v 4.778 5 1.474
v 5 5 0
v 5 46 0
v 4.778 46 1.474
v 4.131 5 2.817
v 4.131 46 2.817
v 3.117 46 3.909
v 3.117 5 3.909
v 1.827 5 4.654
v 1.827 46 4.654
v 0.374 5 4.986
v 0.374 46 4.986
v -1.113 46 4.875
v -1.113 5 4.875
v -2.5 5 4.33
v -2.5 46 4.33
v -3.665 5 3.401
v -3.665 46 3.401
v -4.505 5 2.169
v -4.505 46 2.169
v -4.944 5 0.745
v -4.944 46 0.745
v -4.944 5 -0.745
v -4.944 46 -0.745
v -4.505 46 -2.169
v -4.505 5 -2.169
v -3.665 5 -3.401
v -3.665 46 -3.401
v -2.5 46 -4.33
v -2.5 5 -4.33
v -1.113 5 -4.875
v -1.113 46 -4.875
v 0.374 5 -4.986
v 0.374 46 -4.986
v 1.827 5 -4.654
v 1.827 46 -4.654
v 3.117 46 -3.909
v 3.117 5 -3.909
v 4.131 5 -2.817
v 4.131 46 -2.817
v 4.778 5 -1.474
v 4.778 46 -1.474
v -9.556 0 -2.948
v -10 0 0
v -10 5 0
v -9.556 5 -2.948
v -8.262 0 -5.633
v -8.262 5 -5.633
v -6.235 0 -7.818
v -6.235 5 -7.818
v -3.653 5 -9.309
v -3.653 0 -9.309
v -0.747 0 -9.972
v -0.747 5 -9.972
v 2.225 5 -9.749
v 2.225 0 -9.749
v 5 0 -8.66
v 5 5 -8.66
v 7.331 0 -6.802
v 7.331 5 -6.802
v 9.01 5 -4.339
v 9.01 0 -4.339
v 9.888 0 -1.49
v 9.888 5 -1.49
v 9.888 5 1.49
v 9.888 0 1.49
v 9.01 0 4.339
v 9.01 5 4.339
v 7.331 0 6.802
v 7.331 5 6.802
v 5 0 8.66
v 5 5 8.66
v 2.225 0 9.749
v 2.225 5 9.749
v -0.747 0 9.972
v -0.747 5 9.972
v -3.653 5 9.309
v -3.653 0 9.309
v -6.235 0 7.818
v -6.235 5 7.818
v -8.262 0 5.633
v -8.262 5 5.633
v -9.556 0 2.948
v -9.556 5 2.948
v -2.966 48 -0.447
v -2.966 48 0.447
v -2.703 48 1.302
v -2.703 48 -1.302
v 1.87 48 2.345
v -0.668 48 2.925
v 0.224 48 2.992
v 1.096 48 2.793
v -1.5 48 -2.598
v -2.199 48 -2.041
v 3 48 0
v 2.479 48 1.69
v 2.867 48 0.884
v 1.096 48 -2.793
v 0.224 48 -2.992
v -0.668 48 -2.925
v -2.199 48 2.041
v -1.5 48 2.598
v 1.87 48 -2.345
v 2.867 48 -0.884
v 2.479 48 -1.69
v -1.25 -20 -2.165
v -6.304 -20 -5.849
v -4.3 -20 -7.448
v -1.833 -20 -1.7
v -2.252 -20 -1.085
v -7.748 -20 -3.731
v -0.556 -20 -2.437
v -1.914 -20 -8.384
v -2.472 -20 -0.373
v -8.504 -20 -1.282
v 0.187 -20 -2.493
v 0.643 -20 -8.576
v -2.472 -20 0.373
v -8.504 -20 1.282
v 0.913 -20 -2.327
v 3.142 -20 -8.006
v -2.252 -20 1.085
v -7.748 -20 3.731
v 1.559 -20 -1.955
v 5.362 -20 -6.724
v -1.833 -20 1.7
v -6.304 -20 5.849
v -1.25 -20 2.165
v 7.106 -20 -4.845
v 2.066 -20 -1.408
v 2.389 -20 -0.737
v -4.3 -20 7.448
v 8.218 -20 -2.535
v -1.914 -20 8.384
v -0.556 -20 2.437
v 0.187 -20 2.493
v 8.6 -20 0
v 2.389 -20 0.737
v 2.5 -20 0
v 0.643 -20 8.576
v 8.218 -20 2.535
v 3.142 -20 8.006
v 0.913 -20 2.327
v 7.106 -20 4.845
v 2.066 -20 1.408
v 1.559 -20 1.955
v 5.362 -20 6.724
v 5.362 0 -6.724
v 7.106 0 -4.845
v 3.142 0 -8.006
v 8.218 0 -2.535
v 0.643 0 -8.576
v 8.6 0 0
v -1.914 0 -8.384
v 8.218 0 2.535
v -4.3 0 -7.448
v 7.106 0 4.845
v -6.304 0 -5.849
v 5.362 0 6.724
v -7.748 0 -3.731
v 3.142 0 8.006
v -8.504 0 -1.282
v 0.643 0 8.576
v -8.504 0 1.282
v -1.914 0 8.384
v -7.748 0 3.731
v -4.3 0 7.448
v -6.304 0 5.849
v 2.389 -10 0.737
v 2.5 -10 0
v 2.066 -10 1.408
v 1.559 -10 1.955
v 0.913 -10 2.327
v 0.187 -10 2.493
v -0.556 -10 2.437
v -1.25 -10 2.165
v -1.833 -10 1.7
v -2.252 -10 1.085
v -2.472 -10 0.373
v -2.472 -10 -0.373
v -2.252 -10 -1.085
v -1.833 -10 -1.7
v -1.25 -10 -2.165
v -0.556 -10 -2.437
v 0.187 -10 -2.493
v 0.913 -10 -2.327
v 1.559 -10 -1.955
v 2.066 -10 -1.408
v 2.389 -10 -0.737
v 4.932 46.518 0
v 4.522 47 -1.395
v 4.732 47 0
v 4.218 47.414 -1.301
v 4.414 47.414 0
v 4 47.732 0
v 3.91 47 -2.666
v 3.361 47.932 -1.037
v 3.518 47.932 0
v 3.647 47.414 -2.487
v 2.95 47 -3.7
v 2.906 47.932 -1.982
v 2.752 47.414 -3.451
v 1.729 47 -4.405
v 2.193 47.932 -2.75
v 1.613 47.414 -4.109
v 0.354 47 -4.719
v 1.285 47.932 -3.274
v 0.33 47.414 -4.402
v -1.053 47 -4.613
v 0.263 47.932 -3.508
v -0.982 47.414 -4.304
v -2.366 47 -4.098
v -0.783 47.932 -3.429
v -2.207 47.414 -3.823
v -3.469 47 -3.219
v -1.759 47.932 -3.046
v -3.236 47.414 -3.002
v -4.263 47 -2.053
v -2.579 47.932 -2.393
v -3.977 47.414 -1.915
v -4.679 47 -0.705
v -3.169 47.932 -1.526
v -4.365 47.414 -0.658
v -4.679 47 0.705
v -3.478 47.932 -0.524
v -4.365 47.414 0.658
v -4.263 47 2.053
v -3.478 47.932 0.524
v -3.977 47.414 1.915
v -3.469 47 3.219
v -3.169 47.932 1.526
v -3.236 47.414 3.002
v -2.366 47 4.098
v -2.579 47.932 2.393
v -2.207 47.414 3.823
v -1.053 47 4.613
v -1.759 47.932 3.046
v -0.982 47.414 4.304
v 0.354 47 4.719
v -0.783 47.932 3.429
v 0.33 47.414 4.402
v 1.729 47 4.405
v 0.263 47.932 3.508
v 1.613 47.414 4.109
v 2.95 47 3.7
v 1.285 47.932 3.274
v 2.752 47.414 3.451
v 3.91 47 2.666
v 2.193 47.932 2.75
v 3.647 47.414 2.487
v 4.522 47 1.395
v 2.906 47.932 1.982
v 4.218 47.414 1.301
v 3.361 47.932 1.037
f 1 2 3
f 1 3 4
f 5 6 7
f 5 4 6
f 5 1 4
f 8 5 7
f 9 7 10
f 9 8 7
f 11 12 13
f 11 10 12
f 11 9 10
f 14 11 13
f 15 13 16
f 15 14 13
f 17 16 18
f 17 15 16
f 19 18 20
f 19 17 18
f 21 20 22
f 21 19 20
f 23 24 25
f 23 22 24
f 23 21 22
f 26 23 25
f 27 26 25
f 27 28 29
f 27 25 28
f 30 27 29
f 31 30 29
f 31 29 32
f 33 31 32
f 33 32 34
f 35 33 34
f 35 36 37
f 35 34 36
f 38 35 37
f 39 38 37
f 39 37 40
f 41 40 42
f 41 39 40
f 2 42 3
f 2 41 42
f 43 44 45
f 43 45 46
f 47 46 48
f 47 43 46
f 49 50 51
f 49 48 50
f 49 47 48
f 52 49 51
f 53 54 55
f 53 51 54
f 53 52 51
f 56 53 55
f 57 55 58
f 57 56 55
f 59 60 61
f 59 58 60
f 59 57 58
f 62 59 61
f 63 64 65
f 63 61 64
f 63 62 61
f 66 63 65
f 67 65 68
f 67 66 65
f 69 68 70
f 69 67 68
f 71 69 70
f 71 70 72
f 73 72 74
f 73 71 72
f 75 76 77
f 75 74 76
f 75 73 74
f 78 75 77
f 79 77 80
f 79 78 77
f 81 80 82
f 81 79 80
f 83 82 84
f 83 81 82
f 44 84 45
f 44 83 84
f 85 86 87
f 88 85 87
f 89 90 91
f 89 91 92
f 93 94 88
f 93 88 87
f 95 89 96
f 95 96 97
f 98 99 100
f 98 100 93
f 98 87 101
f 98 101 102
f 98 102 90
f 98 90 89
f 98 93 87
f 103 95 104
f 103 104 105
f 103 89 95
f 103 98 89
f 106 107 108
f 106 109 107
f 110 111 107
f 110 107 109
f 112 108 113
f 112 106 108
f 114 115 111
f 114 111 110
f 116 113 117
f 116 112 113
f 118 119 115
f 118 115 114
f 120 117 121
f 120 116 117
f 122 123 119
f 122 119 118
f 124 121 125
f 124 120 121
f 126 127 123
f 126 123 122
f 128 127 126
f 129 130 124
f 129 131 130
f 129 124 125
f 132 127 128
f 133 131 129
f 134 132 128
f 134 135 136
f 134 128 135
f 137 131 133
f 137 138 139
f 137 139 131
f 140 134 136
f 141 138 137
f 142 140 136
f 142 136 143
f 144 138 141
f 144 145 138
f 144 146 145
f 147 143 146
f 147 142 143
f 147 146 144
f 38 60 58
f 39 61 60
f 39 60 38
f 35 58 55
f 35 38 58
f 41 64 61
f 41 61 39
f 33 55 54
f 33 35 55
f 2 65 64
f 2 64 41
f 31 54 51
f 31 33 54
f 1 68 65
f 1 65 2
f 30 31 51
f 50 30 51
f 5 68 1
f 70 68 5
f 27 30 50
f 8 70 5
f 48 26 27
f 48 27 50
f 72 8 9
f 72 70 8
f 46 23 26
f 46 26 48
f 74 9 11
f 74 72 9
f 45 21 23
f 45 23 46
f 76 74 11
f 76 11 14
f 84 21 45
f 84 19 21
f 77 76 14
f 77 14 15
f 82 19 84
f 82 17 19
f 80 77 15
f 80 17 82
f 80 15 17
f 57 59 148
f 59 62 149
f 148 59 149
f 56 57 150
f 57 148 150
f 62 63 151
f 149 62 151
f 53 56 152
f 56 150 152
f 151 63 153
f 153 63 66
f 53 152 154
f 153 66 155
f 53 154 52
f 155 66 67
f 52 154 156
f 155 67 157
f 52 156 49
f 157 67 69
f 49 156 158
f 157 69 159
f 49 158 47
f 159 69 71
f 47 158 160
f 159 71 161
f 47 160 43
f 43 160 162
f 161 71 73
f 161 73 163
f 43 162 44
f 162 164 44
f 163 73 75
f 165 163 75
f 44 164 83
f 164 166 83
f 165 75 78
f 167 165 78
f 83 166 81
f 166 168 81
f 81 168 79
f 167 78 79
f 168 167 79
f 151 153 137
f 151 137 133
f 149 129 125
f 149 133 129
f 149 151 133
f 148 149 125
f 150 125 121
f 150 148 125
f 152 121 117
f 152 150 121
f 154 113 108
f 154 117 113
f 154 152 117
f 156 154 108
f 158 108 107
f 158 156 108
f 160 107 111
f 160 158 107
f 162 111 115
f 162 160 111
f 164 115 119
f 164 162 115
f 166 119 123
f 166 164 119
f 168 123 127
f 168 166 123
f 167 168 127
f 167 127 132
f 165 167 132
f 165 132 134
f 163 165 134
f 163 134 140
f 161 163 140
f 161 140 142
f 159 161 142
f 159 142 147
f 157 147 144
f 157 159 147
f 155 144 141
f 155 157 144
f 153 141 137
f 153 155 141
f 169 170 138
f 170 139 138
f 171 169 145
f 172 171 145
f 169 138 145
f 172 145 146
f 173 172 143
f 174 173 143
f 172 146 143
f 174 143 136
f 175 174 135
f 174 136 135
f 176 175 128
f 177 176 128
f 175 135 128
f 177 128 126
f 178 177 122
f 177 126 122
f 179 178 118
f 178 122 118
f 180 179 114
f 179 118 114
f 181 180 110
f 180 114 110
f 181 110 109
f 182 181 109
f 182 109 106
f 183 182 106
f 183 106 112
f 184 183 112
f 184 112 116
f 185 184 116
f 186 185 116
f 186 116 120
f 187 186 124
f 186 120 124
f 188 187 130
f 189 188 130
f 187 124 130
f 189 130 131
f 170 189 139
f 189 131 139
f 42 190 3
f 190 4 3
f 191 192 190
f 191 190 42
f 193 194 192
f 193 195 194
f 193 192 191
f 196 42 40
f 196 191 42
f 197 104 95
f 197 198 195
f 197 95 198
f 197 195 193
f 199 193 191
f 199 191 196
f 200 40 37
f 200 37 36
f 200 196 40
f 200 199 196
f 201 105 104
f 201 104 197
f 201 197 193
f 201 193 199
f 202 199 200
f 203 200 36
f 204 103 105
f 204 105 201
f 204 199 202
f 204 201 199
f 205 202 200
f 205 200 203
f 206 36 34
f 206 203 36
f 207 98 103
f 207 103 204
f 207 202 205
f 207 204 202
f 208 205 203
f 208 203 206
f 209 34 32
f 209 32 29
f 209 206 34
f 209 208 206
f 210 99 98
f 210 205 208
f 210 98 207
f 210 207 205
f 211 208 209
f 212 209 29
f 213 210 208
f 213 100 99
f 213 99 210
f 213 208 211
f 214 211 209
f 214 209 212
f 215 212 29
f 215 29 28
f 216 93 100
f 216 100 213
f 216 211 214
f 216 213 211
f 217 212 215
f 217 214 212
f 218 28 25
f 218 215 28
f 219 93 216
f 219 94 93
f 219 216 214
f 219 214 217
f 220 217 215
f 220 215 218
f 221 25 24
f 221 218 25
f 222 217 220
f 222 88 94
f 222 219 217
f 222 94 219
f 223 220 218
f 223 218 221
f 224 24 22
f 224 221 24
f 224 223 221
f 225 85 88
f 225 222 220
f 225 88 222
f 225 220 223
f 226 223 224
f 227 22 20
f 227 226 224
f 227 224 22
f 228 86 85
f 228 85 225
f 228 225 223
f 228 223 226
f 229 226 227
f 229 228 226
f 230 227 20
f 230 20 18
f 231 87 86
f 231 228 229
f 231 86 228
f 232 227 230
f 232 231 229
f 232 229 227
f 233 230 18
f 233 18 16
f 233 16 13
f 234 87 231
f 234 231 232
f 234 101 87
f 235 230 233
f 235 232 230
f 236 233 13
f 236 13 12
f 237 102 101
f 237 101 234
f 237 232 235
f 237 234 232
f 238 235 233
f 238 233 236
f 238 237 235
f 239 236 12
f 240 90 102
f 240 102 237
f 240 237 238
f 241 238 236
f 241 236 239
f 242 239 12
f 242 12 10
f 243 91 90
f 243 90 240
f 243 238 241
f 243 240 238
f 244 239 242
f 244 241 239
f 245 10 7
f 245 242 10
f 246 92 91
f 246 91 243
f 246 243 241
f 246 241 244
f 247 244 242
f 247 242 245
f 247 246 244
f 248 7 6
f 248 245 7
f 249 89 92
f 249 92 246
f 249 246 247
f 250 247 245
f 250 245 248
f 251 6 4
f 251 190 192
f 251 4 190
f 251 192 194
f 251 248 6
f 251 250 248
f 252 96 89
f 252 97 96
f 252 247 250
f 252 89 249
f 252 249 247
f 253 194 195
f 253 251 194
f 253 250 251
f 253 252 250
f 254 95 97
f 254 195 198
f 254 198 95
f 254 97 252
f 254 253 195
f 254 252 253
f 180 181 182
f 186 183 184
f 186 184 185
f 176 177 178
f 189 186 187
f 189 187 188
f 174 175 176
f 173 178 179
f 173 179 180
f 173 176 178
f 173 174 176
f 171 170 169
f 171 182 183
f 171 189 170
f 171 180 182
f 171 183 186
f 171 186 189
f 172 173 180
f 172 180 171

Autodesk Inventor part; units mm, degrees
ref_plane "YZ Plane" through (0, 0, 0) normal (1, 0, 0) x (0, 1, 0)
ref_plane "XZ Plane" through (0, 0, 0) normal (0, 1, 0) x (-1, 0, 0)
ref_plane "XY Plane" through (0, 0, 0) normal (0, 0, 1) x (1, 0, 0)
sketch "Sketch1" plane through (0, 0, 0) normal (0, 1, 0) x (-1, 0, 0)
  circle A0 centre (0, 0) radius 10
  circle A1 centre (0, 0) radius 8.6
extrude "Extrusion1" add sketch "Sketch1" along normal blind 5 contours A0 | A1
sketch "Sketch2" plane through (0, 0, 0) normal (0, -1, 0) x (1, 0, 0)
  circle A0 centre (0, 0) radius 8.6
  circle A1 centre (0, 0) radius 2.5
extrude "Extrusion2" add sketch "Sketch2" along normal blind 20 contours A0 | A1
sketch "Sketch3" plane through (0, -20, 0) normal (0, -1, 0) x (1, 0, 0)
  circle A0 centre (0, 0) radius 2.5
extrude "Extrusion3" cut sketch "Sketch3" against normal blind 10
sketch "Sketch4" plane through (0, 5, 0) normal (0, 1, 0) x (1, 0, 0)
  circle A0 centre (0, 0) radius 5
extrude "Extrusion4" add sketch "Sketch4" along normal blind 43
fillet "Fillet1" radius 2 1 edges at (-5, 48, 0)
properties part number "driven_shaft" material "Gold"
